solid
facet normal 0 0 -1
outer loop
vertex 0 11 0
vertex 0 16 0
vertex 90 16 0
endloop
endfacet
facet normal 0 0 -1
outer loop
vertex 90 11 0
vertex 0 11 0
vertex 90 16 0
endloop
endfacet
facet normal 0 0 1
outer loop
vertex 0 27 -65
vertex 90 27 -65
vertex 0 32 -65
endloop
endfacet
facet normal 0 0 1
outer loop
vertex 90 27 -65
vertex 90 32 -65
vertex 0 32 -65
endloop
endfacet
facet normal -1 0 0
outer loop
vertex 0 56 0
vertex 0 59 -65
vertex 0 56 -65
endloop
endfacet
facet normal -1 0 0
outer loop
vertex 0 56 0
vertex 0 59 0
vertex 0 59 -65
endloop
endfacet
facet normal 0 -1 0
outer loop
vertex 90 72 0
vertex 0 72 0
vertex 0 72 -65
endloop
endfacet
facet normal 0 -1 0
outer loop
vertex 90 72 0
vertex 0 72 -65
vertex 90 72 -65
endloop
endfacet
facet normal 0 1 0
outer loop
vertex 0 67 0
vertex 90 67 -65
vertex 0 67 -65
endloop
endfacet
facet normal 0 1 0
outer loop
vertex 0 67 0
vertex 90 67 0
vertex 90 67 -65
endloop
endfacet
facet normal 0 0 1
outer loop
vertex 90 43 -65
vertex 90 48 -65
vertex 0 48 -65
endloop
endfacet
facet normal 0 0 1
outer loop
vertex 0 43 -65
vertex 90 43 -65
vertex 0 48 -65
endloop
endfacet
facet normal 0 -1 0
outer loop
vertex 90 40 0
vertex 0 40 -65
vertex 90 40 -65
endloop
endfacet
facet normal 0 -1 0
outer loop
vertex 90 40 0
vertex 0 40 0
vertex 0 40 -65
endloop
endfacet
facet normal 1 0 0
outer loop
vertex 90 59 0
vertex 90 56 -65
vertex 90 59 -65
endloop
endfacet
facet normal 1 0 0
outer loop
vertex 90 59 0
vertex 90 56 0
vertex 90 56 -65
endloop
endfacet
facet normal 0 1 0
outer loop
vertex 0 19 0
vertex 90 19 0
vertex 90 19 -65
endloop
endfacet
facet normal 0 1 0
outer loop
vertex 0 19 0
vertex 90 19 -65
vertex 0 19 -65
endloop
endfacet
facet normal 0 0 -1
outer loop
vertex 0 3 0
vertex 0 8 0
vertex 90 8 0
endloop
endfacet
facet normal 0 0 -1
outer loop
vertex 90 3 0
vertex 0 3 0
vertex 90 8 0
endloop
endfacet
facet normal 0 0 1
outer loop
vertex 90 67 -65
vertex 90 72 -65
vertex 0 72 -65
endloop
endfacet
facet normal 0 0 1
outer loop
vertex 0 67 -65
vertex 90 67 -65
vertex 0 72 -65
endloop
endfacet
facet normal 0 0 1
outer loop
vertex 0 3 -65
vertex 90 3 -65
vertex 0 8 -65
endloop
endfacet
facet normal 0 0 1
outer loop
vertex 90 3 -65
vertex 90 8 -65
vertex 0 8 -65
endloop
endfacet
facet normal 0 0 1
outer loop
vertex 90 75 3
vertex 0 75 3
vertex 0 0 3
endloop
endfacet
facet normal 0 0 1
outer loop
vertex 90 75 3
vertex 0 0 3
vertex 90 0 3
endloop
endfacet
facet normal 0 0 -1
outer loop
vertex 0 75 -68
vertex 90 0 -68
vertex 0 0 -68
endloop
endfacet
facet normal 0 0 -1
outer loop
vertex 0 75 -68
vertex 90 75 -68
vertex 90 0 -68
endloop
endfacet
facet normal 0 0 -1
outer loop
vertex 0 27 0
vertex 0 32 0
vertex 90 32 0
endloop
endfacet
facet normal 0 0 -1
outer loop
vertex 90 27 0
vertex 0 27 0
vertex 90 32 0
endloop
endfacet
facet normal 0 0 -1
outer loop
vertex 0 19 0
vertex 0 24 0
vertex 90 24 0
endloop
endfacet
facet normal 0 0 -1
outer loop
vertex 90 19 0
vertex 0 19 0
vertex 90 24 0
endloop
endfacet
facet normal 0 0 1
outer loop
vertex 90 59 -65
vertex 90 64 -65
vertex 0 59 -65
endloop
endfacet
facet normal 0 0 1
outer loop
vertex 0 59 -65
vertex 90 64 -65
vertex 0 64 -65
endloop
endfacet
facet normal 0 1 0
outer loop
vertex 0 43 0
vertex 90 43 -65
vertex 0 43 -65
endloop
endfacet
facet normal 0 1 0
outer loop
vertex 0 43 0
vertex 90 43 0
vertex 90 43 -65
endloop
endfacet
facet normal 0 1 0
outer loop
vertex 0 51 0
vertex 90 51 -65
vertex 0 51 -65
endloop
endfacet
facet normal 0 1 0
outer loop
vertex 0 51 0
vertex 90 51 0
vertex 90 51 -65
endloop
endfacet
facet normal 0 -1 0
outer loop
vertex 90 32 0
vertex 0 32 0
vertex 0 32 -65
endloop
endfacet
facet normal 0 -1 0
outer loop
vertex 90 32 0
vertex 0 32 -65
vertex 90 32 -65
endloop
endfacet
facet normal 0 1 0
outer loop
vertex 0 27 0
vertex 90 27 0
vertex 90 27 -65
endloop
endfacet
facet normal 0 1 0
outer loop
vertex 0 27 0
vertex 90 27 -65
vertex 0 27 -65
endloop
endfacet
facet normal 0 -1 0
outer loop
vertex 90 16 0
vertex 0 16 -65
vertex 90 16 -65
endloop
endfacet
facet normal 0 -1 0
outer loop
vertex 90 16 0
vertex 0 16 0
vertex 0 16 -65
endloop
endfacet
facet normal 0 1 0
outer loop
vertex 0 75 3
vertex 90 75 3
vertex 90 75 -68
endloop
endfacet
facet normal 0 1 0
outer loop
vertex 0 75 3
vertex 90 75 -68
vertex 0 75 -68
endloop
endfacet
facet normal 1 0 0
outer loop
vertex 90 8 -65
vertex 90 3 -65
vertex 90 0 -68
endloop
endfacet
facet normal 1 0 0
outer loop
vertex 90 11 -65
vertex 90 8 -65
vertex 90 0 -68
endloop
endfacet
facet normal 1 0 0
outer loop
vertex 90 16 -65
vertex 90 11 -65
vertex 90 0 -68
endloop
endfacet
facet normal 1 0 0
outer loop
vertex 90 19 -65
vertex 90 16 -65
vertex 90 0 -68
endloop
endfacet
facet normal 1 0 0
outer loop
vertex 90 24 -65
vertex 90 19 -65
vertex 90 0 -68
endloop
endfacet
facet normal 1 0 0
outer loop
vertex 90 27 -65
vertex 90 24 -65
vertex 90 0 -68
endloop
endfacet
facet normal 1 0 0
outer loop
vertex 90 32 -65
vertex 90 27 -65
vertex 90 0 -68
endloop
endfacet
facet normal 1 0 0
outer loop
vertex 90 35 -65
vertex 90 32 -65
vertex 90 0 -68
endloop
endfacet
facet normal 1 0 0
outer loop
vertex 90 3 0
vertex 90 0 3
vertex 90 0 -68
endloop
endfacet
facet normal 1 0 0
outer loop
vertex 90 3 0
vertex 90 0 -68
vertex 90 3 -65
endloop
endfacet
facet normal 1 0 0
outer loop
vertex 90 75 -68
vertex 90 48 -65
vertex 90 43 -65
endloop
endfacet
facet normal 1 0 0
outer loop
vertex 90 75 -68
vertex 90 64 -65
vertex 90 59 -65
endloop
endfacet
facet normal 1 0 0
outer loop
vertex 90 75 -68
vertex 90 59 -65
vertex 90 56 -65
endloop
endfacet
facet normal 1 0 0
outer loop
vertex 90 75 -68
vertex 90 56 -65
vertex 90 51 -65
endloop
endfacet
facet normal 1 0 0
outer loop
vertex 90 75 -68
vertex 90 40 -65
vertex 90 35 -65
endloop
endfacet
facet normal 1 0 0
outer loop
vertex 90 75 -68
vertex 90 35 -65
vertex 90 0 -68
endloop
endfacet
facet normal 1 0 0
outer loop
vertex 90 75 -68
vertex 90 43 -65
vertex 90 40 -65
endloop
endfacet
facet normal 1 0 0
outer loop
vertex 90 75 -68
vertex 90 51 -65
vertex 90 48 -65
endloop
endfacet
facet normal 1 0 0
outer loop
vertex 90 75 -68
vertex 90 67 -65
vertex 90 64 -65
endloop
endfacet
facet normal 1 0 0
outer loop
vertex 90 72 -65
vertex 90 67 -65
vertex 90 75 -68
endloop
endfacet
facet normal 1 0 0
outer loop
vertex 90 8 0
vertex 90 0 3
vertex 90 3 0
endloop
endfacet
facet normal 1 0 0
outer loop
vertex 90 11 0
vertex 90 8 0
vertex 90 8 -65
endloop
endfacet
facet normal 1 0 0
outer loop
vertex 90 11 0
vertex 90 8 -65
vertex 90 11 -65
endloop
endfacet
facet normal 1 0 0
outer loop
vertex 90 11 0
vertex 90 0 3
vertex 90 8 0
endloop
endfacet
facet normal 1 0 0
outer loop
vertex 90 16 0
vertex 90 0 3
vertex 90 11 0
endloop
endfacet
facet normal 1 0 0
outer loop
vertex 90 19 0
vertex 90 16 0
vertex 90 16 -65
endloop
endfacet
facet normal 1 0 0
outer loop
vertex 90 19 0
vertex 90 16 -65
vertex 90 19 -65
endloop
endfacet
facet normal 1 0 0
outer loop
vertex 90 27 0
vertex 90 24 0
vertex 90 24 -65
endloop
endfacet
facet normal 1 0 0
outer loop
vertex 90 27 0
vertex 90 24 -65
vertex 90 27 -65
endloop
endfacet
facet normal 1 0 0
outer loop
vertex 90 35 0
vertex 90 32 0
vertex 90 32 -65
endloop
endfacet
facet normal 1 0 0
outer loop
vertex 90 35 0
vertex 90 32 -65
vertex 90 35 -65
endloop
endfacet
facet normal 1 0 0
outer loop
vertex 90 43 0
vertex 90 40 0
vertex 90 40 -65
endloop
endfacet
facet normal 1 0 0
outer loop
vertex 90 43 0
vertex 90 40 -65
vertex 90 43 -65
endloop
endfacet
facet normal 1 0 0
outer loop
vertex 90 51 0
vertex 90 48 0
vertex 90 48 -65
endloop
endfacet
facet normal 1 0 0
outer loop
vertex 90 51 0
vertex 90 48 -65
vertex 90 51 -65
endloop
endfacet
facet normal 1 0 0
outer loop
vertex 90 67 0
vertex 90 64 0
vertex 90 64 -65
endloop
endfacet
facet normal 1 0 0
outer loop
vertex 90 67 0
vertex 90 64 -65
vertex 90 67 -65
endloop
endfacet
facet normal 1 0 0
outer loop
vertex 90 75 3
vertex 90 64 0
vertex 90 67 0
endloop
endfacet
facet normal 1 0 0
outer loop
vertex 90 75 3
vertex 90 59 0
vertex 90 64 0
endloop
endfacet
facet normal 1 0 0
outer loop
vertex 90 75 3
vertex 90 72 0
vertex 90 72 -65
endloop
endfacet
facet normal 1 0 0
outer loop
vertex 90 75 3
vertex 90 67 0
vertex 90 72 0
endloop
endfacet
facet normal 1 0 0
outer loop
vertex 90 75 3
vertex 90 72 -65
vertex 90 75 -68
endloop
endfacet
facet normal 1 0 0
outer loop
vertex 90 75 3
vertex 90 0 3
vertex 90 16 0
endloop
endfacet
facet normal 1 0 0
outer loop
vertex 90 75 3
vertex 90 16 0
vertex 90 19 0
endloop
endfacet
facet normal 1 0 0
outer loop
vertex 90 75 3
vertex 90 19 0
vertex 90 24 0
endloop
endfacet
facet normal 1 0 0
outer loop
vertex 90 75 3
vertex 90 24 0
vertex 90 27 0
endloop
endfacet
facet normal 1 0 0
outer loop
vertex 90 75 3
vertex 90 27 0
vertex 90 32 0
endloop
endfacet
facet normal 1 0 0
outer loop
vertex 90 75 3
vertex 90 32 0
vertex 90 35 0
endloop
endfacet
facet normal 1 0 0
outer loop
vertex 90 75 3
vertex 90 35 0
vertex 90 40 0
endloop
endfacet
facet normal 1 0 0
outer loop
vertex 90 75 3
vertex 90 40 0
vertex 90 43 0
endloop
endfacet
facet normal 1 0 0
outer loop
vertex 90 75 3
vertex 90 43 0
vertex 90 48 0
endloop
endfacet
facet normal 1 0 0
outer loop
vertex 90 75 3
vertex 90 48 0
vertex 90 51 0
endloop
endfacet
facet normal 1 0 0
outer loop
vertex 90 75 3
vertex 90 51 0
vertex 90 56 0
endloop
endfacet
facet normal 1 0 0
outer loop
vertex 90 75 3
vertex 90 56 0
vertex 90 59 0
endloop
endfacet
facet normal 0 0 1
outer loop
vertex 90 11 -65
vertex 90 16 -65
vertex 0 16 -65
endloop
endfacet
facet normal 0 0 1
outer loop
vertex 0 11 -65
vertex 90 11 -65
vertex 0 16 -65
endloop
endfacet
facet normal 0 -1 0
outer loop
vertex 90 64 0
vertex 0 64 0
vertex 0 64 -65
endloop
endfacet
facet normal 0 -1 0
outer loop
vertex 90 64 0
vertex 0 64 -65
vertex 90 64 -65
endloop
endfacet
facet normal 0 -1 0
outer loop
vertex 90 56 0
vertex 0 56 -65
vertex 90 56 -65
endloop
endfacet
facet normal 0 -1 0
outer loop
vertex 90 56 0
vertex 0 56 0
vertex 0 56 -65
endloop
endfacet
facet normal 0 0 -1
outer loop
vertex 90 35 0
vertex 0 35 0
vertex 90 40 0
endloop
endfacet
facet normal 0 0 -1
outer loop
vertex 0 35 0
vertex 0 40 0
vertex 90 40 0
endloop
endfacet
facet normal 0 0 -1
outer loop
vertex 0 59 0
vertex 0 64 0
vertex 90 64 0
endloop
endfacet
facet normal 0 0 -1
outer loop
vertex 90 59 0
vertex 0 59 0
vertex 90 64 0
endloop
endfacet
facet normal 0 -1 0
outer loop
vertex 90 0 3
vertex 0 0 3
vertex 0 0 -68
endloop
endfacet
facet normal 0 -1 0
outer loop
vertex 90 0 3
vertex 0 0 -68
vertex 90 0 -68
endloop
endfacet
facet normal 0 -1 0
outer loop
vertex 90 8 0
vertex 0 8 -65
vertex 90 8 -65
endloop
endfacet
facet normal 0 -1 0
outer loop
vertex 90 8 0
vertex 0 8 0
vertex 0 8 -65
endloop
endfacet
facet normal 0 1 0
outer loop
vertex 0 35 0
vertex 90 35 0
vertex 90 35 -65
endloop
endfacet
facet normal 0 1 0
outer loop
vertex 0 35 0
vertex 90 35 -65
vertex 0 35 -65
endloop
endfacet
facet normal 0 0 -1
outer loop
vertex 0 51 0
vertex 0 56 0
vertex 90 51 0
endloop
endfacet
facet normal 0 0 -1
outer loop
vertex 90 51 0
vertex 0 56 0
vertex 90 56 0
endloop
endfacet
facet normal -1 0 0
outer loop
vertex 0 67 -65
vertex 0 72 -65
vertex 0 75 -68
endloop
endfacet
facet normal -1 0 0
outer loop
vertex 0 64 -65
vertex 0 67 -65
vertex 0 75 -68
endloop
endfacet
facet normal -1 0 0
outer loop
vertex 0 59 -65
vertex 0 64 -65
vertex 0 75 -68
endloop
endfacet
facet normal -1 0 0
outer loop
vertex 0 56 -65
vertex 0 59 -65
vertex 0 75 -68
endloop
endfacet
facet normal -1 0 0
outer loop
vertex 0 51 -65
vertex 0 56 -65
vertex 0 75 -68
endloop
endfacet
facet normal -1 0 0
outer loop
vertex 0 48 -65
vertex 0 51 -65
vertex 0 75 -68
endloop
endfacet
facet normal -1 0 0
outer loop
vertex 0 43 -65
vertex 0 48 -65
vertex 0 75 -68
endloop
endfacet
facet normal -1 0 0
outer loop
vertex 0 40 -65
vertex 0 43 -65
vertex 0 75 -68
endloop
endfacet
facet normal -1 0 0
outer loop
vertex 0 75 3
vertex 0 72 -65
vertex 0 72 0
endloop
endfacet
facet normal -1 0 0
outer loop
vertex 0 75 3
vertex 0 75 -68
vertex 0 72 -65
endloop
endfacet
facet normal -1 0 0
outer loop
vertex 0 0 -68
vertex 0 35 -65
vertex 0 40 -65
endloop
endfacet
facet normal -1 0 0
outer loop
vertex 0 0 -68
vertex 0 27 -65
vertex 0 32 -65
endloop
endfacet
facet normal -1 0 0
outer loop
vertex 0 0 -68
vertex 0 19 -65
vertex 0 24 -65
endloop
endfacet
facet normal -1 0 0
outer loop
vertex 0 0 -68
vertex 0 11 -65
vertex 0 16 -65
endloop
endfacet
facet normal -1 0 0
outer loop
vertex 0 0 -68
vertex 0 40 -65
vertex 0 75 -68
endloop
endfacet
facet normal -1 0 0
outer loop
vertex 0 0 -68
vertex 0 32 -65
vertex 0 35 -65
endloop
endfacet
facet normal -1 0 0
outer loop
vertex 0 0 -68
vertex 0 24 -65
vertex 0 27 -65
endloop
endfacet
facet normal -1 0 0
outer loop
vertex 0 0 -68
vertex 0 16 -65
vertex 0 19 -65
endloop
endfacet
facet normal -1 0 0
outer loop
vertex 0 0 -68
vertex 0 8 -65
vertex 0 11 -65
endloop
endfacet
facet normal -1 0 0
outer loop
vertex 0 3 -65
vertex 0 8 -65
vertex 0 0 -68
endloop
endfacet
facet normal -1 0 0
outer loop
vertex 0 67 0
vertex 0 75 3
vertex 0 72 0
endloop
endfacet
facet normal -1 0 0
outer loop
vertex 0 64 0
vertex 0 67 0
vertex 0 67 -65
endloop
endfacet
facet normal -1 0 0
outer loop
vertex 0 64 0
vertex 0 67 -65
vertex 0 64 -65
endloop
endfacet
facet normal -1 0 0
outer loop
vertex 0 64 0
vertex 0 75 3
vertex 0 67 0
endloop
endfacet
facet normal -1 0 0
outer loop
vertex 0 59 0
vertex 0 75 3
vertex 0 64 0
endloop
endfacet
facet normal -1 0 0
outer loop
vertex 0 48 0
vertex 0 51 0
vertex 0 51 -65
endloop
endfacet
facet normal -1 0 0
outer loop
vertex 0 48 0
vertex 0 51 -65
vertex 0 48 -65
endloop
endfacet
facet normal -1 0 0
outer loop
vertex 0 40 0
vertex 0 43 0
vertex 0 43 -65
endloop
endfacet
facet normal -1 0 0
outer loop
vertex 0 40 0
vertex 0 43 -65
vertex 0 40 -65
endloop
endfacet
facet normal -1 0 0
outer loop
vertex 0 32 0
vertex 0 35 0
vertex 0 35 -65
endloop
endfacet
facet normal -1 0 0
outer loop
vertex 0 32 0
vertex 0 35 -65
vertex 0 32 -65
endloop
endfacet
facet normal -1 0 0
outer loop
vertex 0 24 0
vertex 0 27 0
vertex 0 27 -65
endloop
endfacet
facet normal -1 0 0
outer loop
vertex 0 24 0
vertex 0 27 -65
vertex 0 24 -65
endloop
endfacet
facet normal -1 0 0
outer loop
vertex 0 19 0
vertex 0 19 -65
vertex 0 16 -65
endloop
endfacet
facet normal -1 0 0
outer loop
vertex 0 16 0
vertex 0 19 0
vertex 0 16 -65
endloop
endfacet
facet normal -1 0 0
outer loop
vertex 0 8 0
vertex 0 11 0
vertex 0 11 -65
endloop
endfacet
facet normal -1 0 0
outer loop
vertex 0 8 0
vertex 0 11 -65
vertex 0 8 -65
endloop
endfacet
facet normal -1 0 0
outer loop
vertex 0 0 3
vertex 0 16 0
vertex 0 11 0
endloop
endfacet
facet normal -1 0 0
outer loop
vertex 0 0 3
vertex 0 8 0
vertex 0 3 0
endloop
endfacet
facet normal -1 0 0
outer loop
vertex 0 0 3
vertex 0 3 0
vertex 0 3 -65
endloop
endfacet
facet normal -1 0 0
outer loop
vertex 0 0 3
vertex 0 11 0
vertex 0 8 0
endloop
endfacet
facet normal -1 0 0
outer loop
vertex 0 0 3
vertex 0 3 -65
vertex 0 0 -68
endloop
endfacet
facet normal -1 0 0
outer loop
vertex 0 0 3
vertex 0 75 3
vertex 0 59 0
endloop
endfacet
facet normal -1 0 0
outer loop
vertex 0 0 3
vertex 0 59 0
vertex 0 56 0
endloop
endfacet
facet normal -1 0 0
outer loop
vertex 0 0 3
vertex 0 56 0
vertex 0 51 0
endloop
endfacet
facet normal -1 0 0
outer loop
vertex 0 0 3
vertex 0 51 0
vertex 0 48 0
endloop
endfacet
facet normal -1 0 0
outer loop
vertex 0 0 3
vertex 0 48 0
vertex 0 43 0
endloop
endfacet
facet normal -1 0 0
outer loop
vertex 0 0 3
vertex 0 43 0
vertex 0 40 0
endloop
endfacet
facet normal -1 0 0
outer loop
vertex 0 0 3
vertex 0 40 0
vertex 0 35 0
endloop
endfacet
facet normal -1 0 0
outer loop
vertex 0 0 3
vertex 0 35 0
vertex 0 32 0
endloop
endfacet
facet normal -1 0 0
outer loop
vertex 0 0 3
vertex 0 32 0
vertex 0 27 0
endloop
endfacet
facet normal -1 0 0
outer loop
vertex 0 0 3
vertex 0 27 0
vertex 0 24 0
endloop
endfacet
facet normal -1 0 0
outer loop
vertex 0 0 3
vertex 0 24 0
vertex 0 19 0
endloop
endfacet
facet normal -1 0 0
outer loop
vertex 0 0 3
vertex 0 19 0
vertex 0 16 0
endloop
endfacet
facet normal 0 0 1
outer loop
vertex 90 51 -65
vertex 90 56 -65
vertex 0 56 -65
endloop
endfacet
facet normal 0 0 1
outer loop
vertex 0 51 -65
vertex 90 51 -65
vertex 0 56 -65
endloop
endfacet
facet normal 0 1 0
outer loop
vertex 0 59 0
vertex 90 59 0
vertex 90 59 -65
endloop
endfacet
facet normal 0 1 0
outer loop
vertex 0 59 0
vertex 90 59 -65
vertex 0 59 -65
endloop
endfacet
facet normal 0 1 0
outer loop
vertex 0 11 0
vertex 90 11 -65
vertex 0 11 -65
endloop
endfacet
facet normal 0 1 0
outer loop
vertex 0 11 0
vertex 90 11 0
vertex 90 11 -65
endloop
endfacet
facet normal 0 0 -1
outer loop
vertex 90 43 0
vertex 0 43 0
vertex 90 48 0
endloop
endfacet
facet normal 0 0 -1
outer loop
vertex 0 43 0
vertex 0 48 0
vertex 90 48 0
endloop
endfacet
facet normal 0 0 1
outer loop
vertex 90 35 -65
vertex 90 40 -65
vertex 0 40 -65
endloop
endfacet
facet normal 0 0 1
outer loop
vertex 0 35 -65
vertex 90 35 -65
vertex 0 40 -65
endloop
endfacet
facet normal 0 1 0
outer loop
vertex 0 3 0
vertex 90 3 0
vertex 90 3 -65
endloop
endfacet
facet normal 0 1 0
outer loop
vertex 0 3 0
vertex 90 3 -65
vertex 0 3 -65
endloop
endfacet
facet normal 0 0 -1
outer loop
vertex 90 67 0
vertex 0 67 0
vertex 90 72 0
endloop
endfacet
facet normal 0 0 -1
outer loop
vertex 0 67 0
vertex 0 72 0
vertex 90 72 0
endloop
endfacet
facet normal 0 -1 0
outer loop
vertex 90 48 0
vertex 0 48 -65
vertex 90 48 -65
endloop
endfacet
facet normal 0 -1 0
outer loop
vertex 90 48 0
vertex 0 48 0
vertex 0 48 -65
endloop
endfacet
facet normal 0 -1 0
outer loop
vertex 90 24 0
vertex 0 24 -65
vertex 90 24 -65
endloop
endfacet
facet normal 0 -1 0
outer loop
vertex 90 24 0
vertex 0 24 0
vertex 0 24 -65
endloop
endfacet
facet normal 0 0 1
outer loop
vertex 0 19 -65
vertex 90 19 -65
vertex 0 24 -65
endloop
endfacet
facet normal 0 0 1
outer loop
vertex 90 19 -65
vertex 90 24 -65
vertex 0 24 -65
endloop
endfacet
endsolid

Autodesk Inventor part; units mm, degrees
ref_plane "YZ Plane" through (0, 0, 0) normal (1, 0, 0) x (0, 1, 0)
ref_plane "XZ Plane" through (0, 0, 0) normal (0, 1, 0) x (-1, 0, 0)
ref_plane "XY Plane" through (0, 0, 0) normal (0, 0, 1) x (1, 0, 0)
sketch "Sketch1" plane through (0, 0, 0) normal (0, 0, 1) x (1, 0, 0)
  line L0 (0, 0) -> (90, 0)
  line L1 (90, 0) -> (90, 3)
  line L2 (90, 3) -> (0, 3)
  line L3 (0, 3) -> (0, 0)
  line L4 (0, 8) -> (90, 8)
  line L5 (90, 8) -> (90, 11)
  line L6 (90, 11) -> (0, 11)
  line L7 (0, 11) -> (0, 8)
  line L8 (0, 16) -> (90, 16)
  line L9 (90, 16) -> (90, 19)
  line L10 (90, 19) -> (0, 19)
  line L11 (0, 19) -> (0, 16)
  line L12 (0, 24) -> (90, 24)
  line L13 (90, 24) -> (90, 27)
  line L14 (90, 27) -> (0, 27)
  line L15 (0, 27) -> (0, 24)
  line L16 (0, 32) -> (90, 32)
  line L17 (90, 32) -> (90, 35)
  line L18 (90, 35) -> (0, 35)
  line L19 (0, 35) -> (0, 32)
  line L20 (0, 40) -> (90, 40)
  line L21 (90, 40) -> (90, 43)
  line L22 (90, 43) -> (0, 43)
  line L23 (0, 43) -> (0, 40)
  line L24 (0, 48) -> (90, 48)
  line L25 (90, 48) -> (90, 51)
  line L26 (90, 51) -> (0, 51)
  line L27 (0, 51) -> (0, 48)
  line L28 (0.0005, 56) -> (90.0005, 56)
  line L29 (90.0005, 56) -> (90.0005, 59)
  line L30 (90.0005, 59) -> (0.0005, 59)
  line L31 (0.0005, 59) -> (0.0005, 56)
  line L32 (0, 64) -> (90, 64)
  line L33 (90, 64) -> (90, 67)
  line L34 (90, 67) -> (0, 67)
  line L35 (0, 67) -> (0, 64)
  line L36 (0, 72) -> (90, 72)
  line L37 (90, 72) -> (90, 75)
  line L38 (90, 75) -> (0, 75)
  line L39 (0, 75) -> (0, 72)
  line L40 (0, 75) -> (90, 75)
  line L41 (90, 75) -> (90, 0)
  line L42 (90, 0) -> (0, 0)
  line L43 (0, 0) -> (0, 75)
  dimension "d0" = 3
  dimension "d1" = 90
  dimension "d2" = 3
  dimension "d3" = 90
  dimension "d4" = 3
  dimension "d5" = 90
  dimension "d6" = 3
  dimension "d7" = 90
  dimension "d8" = 3
  dimension "d9" = 90
  dimension "d10" = 3
  dimension "d11" = 90
  dimension "d12" = 3
  dimension "d13" = 90
  dimension "d14" = 3
  dimension "d15" = 90
  dimension "d16" = 3
  dimension "d17" = 90
  dimension "d18" = 3
  dimension "d19" = 90
  dimension "d20" = 5
  dimension "d21" = 5
  dimension "d22" = 5
  dimension "d23" = 5
  dimension "d24" = 5
  dimension "d25" = 5
  dimension "d26" = 5
  dimension "d27" = 5
  dimension "d28" = 5
extrude "Extrusion1" add sketch "Sketch1" against normal blind 65 contours L3 L2 L1 L0 | L7 L6 L5 L4 | L11 L10 L9 L8 | L15 L14 L13 L12 | L19 L18 L17 L16 | L23 L22 L21 L20 | L27 L26 L25 L24 | L31 L30 L29 L28 | L35 L34 L33 L32 | L39 L38 L37 L36
sketch "Sketch2" plane through (0, 0, 0) normal (0, 0, 1) x (1, 0, 0)
  point P0 (0, 0)
sketch "Sketch3" plane through (0, 0, 0) normal (0, 0, 1) x (1, 0, 0)
  line L0 (0, 72) -> (0, 75) projected
  line L1 (90, 0) -> (0, 0)
  line L2 (0, 0) -> (0, 75)
  line L3 (0, 75) -> (90, 75)
  line L4 (90, 75) -> (90, 0)
  line L5 (0, 75) -> (90, 75)
  line L6 (90, 75) -> (90, 95)
  line L7 (90, 95) -> (0, 95)
  line L8 (0, 95) -> (0, 75)
  line L9 (0, 0) -> (90, 0)
  line L10 (90, 0) -> (90, -20)
  line L11 (90, -20) -> (0, -20)
  line L12 (0, -20) -> (0, 0)
  point P0 (0, 0)
  dimension "d35" = 20
  dimension "d36" = 90
  dimension "d37" = 20
  dimension "d38" = 90
extrude "Extrusion2" add sketch "Sketch3" along normal blind 3 contours L0 L3 L4 L1 L2
sketch "Sketch4" plane through (0, 0, -65) normal (0, -1, 0) x (1, 0, 0)
  point P0 (0, 65)
sketch "Sketch5" plane through (0, 0, -65) normal (0, 0, -1) x (-1, 0, 0)
  line L0 (-90, 75) -> (0, 75) projected
  line L1 (-90, 75) -> (0, 75)
  line L2 (0, 75) -> (0, 0)
  line L3 (0, 0) -> (-90, 0)
  line L4 (-90, 0) -> (-90, 75)
extrude "Extrusion3" add sketch "Sketch5" along normal blind 3
properties part number "stack"
